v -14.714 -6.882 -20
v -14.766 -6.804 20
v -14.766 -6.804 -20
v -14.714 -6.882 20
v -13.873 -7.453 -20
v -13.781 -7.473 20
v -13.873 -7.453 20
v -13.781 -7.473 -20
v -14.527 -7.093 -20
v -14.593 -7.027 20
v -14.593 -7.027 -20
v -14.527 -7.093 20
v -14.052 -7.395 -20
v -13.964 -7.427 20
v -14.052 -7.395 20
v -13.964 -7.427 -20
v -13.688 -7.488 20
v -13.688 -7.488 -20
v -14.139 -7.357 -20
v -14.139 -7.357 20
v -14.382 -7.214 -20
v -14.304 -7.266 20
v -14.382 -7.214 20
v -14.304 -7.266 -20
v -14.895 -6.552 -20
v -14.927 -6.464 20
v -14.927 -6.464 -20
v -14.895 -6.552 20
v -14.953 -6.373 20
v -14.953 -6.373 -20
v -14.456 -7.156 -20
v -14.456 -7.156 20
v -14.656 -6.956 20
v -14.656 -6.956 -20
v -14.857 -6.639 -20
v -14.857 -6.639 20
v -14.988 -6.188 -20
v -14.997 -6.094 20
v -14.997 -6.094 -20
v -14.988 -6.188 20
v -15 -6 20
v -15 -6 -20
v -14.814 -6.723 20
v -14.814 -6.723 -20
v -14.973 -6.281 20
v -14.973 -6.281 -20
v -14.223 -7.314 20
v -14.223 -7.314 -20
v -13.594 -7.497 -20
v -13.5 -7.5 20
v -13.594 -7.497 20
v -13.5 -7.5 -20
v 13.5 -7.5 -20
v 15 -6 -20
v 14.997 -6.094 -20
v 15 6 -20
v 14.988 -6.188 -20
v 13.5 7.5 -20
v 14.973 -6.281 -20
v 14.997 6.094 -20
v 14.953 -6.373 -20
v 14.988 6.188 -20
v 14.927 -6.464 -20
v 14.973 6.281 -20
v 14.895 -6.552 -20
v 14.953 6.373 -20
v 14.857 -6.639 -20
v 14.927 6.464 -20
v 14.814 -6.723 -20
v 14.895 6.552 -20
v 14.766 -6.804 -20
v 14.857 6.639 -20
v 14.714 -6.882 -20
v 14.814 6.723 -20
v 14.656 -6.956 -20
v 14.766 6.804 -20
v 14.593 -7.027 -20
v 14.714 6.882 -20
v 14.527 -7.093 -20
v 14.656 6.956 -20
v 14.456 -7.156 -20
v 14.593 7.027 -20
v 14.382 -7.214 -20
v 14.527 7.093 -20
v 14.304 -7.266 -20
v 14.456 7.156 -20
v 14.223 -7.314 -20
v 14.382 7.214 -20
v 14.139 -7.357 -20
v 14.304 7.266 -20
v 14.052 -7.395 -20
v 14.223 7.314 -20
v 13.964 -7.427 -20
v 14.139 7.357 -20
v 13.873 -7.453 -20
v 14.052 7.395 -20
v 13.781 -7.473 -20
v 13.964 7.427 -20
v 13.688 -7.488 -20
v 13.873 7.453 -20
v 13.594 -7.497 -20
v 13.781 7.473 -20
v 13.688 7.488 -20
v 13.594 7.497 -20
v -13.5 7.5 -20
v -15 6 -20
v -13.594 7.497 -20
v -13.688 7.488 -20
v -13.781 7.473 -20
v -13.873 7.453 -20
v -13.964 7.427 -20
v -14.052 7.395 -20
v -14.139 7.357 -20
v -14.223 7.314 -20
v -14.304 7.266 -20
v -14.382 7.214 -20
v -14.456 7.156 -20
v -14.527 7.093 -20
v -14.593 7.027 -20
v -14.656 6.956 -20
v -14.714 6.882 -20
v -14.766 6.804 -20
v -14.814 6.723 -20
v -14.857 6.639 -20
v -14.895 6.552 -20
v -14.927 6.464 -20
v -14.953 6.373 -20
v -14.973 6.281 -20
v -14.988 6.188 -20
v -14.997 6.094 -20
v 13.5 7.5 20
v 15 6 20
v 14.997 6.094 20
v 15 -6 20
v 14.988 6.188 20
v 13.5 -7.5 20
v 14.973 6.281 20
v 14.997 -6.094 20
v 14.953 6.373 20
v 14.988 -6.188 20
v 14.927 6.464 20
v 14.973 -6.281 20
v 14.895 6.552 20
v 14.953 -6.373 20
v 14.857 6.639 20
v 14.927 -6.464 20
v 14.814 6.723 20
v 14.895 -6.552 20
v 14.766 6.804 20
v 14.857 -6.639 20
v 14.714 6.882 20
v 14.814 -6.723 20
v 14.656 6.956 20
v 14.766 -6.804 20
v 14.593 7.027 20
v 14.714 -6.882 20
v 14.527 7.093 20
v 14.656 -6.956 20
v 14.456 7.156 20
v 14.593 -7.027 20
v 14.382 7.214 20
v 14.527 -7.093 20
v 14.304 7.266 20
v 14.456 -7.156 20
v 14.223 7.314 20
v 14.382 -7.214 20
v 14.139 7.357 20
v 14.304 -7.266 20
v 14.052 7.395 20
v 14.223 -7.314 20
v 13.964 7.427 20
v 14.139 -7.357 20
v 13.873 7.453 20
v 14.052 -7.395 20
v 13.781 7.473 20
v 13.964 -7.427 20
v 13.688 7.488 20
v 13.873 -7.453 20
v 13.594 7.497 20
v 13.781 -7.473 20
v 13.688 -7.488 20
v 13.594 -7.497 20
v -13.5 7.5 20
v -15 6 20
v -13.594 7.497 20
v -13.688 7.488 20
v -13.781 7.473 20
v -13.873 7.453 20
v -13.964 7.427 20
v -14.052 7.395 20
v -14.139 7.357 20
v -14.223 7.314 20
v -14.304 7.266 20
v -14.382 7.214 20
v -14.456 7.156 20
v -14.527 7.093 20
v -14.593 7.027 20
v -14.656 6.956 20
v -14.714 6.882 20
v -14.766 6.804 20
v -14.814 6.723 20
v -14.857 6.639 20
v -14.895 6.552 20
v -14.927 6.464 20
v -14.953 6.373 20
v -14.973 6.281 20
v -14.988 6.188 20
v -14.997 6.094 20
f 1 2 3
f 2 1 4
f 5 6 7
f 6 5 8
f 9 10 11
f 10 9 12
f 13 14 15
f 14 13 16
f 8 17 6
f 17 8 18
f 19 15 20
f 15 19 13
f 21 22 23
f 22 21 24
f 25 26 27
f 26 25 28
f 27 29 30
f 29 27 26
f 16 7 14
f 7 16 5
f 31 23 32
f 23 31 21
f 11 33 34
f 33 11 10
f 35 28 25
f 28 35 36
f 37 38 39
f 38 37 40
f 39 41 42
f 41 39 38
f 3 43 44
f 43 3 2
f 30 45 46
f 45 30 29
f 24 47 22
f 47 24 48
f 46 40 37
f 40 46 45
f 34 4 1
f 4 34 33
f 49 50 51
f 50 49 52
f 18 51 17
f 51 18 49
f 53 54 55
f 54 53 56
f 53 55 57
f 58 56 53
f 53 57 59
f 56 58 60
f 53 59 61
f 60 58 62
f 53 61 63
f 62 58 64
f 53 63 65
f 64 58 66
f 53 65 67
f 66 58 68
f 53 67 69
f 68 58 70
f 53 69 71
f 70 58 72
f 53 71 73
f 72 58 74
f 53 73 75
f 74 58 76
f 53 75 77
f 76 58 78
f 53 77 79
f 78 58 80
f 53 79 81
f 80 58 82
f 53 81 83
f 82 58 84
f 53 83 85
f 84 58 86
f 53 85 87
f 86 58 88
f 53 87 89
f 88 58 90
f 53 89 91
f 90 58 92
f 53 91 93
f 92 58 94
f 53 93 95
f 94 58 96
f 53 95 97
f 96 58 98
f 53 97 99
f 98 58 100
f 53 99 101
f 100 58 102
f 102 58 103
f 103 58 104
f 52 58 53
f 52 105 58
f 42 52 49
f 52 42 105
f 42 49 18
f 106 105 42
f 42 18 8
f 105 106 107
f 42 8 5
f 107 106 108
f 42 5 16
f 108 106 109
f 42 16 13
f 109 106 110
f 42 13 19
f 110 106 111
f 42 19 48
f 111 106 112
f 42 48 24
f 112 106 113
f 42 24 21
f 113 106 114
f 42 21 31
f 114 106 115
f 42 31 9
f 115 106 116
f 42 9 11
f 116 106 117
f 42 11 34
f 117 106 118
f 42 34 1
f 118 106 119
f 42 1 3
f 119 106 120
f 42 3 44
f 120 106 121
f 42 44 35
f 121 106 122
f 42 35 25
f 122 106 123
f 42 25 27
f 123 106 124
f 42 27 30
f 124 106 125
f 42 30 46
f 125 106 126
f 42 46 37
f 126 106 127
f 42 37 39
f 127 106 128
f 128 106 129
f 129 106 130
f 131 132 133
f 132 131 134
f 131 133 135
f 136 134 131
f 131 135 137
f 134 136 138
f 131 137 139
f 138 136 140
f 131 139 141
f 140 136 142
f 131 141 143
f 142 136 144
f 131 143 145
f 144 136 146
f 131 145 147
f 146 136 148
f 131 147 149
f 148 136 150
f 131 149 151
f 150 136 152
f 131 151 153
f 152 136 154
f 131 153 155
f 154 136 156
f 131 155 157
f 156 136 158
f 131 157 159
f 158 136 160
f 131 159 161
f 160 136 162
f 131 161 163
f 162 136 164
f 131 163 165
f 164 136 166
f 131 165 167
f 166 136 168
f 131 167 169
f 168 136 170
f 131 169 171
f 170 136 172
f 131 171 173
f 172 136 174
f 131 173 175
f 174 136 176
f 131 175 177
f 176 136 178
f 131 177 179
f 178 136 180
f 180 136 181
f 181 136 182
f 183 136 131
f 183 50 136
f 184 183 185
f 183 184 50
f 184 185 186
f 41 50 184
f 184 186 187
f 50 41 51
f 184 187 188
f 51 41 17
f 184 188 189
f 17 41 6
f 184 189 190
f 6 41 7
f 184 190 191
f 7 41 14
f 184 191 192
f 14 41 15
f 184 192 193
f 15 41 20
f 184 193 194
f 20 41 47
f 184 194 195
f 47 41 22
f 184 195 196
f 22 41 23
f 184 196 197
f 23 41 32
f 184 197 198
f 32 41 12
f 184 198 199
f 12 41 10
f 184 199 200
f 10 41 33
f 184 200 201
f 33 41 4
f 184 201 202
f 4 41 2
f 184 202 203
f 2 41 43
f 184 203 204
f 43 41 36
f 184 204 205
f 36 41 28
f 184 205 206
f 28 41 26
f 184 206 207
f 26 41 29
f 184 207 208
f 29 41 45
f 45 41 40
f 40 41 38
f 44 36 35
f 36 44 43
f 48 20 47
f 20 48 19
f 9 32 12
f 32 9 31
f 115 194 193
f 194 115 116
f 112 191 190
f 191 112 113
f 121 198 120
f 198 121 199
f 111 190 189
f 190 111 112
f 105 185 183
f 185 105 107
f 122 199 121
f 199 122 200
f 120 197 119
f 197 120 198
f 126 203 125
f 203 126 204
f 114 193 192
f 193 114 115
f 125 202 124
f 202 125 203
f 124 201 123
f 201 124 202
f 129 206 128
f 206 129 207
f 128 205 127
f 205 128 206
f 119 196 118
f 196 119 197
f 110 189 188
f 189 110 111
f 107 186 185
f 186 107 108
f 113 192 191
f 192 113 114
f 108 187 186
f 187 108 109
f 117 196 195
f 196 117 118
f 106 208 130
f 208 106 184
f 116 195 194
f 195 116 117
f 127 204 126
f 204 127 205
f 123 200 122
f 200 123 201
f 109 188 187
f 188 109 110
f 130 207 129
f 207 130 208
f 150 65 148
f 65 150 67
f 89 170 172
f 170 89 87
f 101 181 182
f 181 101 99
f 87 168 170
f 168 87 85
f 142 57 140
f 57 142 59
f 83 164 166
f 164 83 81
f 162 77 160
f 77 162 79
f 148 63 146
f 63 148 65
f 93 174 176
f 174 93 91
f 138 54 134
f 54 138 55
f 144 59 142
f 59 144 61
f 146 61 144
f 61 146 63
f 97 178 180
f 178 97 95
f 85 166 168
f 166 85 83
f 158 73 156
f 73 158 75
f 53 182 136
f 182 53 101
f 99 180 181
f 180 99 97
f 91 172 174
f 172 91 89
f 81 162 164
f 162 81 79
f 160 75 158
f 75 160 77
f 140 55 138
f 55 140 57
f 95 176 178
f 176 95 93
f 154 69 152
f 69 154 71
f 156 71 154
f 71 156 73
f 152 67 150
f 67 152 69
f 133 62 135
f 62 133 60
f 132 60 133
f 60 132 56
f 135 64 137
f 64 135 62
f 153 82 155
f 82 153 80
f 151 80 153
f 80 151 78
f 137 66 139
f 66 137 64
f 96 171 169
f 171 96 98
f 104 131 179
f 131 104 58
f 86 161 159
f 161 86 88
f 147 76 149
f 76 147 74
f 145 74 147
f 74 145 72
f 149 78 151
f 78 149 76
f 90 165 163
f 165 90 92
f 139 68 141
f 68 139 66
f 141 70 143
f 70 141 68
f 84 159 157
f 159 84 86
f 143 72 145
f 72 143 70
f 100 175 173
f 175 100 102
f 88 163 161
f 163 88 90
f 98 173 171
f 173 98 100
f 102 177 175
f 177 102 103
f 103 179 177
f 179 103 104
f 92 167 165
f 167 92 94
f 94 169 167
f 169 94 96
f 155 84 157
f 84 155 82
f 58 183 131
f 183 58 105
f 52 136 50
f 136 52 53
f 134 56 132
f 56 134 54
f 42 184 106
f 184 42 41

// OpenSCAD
use <MCAD/boxes.scad>;
$fn = 100;
roundedBox([30,15,40],1.5, true);
